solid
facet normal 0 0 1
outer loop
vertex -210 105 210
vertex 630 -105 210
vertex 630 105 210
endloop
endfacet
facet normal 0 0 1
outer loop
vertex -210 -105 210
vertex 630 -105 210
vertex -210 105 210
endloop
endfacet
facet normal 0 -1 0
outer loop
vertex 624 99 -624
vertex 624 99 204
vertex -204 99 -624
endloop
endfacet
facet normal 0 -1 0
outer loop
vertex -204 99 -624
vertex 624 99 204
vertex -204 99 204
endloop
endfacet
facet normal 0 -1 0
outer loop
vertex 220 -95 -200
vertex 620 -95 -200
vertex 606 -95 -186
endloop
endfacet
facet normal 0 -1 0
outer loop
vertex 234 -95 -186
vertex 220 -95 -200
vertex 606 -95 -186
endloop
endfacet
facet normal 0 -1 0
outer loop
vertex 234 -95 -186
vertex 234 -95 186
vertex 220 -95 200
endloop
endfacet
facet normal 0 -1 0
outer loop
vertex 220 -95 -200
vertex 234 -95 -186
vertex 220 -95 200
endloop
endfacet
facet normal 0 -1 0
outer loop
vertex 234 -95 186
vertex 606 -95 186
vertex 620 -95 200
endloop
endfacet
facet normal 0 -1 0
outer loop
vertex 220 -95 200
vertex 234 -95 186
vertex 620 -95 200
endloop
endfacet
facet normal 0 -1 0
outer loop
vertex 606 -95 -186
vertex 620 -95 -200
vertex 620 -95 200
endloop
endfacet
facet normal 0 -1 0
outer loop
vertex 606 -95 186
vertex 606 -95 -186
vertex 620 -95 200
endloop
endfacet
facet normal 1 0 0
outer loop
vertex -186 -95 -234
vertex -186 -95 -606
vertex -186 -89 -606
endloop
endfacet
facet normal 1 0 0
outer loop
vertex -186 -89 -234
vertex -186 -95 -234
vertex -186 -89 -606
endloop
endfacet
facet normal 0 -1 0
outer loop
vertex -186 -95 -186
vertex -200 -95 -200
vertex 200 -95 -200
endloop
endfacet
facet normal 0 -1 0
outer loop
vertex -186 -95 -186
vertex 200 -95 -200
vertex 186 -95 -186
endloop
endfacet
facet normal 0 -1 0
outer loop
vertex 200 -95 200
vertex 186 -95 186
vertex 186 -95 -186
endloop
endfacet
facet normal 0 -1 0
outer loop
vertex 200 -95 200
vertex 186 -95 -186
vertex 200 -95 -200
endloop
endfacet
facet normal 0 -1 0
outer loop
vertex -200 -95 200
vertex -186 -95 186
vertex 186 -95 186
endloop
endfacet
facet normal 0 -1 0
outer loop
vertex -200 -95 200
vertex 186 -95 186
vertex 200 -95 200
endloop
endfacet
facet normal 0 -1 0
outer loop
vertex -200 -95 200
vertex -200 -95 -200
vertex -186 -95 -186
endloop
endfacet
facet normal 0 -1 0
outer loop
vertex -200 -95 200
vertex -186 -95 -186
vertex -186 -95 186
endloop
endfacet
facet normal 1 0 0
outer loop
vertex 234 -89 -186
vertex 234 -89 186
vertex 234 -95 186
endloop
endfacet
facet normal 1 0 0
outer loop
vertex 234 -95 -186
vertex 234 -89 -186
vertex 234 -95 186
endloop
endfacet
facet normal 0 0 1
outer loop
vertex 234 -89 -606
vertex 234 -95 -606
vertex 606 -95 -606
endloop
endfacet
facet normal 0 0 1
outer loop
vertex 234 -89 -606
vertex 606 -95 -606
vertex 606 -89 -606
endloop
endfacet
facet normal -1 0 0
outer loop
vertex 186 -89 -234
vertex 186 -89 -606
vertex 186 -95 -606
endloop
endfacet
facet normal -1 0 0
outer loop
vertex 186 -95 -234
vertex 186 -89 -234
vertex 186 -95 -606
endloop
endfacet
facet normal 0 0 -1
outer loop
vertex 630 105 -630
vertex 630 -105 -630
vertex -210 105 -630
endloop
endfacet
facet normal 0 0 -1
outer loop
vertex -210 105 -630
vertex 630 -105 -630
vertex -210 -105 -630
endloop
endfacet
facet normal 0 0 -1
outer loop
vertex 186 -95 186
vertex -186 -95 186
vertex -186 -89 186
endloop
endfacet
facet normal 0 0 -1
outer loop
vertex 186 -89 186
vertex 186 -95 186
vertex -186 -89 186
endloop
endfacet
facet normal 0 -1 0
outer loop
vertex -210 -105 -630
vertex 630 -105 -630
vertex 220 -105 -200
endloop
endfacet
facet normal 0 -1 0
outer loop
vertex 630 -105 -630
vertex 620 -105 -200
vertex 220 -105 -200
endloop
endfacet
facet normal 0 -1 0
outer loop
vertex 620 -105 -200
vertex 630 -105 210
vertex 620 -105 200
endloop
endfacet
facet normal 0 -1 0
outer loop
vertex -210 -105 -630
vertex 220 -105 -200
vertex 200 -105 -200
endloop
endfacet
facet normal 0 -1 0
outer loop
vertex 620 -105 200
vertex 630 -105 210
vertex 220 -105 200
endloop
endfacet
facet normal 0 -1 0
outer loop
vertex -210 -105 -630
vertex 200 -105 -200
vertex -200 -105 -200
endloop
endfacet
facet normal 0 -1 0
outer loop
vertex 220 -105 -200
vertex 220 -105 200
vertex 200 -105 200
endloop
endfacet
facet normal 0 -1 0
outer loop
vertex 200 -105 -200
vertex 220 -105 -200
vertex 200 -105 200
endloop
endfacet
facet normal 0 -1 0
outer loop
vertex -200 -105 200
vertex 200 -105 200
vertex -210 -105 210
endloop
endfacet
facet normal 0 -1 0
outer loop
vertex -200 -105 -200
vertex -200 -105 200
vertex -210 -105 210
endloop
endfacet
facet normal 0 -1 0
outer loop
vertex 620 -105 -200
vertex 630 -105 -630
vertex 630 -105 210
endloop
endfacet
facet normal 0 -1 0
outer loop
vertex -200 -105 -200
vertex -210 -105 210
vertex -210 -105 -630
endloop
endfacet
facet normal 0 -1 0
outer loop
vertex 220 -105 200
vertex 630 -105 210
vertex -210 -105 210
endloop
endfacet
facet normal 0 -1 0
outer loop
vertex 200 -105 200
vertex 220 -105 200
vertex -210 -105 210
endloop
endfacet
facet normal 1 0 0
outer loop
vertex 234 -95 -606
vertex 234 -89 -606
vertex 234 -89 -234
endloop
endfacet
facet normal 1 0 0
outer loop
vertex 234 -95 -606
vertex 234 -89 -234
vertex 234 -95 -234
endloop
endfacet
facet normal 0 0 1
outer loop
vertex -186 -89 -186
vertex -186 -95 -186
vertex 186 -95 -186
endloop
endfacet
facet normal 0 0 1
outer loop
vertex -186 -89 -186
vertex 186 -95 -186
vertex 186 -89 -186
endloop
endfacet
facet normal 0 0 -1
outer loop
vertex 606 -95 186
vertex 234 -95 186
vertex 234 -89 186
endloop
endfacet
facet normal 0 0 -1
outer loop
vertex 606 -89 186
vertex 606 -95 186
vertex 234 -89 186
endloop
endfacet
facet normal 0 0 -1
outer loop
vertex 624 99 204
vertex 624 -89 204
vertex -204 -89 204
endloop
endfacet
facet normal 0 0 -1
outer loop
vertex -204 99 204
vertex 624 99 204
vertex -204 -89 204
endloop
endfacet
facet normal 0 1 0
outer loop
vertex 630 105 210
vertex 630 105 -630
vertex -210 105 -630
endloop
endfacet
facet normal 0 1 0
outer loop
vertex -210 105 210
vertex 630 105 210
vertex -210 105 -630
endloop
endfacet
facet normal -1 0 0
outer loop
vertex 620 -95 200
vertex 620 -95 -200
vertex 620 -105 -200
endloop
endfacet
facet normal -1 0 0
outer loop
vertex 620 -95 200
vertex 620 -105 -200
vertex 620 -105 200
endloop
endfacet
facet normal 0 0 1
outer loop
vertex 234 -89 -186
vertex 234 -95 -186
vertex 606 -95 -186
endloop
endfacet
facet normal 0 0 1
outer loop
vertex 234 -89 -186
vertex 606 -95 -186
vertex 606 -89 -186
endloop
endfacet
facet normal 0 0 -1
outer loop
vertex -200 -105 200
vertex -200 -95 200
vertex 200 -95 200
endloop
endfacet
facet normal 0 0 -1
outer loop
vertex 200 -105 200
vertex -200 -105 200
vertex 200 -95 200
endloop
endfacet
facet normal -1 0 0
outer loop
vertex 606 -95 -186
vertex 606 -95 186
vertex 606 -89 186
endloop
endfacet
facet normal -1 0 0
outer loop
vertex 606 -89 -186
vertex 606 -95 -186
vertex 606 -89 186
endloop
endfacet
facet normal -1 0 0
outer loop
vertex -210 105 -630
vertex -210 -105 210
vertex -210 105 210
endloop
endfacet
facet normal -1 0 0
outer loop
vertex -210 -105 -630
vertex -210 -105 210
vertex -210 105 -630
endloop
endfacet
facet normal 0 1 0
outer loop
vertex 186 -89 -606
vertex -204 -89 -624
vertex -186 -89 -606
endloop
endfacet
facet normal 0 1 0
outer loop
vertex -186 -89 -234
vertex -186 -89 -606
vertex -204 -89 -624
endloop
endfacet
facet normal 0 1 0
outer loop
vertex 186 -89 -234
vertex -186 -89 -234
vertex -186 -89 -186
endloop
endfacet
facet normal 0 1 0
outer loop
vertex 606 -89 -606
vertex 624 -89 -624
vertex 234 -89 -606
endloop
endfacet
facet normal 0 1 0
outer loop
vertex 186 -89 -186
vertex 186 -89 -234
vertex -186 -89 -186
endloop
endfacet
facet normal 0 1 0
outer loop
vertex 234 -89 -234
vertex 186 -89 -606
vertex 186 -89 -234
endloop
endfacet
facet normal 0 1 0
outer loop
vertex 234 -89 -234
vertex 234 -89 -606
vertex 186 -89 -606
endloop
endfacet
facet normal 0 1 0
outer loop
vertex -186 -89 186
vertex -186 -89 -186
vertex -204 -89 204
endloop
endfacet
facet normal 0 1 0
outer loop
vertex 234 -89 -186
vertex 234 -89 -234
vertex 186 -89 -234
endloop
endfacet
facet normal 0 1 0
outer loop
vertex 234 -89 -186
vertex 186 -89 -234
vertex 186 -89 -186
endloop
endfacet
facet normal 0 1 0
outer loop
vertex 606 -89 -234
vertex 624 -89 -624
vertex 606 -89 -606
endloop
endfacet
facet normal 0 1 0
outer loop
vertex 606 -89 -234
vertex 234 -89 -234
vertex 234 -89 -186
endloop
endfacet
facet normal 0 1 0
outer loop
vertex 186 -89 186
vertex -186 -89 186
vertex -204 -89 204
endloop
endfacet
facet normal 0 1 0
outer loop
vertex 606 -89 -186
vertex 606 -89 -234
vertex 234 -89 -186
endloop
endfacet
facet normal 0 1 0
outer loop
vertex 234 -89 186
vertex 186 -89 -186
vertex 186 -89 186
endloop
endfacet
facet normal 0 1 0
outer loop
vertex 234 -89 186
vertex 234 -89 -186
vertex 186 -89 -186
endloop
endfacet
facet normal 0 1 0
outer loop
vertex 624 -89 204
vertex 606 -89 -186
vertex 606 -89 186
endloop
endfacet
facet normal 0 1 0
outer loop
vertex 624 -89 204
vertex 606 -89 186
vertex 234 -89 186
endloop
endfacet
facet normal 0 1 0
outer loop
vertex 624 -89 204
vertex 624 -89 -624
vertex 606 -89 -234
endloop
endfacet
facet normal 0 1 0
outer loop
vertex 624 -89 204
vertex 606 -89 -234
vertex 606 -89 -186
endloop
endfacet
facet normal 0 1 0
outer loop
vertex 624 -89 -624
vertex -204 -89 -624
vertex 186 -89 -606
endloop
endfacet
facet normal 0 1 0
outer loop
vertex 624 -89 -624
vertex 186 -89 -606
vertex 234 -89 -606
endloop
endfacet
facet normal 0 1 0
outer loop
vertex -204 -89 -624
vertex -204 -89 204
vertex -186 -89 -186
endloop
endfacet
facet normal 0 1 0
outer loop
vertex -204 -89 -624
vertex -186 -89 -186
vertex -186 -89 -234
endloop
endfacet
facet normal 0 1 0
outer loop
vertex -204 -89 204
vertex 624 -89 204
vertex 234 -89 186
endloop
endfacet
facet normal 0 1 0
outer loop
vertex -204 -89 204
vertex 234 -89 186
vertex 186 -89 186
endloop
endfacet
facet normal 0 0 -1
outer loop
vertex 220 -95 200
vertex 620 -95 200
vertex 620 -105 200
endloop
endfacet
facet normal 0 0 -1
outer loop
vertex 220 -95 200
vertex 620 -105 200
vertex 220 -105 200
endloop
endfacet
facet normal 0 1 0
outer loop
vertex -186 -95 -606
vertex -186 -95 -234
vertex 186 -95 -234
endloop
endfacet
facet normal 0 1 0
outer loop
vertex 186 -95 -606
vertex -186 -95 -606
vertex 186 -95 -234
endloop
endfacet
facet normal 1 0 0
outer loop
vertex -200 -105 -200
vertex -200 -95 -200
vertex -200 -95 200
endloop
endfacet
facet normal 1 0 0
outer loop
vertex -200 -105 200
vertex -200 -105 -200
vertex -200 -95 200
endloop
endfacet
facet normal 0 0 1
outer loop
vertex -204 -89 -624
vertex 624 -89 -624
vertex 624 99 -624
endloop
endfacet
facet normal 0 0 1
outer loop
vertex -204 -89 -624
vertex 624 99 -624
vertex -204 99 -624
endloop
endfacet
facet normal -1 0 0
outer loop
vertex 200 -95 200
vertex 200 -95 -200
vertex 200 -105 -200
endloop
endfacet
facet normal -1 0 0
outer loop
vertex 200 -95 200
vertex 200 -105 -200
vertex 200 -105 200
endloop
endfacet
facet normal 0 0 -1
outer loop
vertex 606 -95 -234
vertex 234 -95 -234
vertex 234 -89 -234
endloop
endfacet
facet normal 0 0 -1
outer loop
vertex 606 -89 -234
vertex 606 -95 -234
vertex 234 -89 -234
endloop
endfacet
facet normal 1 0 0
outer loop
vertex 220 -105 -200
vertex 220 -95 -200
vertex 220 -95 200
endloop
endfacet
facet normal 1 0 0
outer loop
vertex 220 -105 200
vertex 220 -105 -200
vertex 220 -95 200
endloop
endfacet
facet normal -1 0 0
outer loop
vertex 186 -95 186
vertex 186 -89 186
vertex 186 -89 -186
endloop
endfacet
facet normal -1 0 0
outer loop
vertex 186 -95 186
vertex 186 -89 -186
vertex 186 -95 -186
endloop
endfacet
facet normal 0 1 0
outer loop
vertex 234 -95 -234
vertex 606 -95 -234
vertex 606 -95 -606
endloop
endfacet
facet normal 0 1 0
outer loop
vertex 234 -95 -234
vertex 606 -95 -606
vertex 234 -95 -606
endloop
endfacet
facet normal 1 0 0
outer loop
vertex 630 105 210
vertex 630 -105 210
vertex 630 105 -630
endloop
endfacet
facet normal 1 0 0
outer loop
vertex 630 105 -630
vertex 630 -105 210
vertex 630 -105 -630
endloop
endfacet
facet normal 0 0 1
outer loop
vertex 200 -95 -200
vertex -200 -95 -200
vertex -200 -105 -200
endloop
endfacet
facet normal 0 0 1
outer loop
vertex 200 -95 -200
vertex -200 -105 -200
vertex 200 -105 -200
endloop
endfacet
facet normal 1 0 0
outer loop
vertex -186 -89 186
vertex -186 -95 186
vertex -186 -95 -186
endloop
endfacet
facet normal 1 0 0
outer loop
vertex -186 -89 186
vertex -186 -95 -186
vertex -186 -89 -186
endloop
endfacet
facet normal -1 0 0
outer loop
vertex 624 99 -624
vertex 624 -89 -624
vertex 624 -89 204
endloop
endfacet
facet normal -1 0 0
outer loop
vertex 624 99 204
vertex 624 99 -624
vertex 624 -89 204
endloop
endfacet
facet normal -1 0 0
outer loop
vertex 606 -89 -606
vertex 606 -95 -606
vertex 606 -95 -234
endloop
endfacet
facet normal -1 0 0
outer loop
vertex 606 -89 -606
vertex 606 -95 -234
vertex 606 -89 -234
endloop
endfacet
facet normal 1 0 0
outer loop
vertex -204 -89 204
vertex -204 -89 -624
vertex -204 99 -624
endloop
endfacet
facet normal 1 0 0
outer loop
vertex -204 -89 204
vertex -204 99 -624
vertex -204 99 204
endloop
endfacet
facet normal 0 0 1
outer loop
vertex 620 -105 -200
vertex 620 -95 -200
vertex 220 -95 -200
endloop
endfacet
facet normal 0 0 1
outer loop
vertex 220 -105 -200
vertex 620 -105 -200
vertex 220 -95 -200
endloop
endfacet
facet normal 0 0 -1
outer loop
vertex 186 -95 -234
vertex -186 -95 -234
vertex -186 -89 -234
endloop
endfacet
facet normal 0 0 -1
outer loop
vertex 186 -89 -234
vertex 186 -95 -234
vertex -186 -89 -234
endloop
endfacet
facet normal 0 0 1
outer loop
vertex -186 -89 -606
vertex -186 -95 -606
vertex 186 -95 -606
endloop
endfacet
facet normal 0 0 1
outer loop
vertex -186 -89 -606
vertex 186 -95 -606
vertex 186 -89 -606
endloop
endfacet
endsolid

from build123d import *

# Parameters (mm, degrees)
F0_W      = 420
F0_H      = 420
F1_DEPTH  = 105
F2_T      = -6
F3_W      = 6
F3_H      = 408
F4_DEPTH  = 18
F5_W      = 6
F5_H      = 408
F6_DEPTH  = 18
F7_W      = 6
F7_H      = 18
F8_DEPTH  = 372
F9_W      = 6
F9_H      = 18
F10_DEPTH = 372
F11_W     = 408
F11_H     = 408
F11_W_2   = 400
F11_H_2   = 400
F12_DEPTH = 10
F14_W     = 400
F14_H     = 400
F15_DEPTH = 10
F16_DEPTH = 25.4
F18_DEPTH = 25.4


with BuildPart() as f1:
    # F0 (on Front) → F1 (new body, symmetric)
    with BuildSketch(Plane.XZ):
        Rectangle(F0_W, F0_H)
    extrude(amount=F1_DEPTH, both=True)

    # F2
    f2_openings = [f1.faces().sort_by_distance(p)[0] for p in [
        (0, -105, 0),
    ]]
    offset(amount=F2_T, openings=f2_openings)

    # F3 (on face) → F4 (join)
    with BuildSketch(Plane.YZ.offset(-204)):
        with Locations((-92, 0)):
            Rectangle(F3_W, F3_H)
    extrude(amount=F4_DEPTH)

    # F5 (on face) → F6 (join)
    with BuildSketch(Plane(origin=(204, 0, 0), x_dir=(0, -1, 0), z_dir=(-1, 0, 0))):
        with Locations((92, 0)):
            Rectangle(F5_W, F5_H)
    extrude(amount=F6_DEPTH)

    # F7 (on face) → F8 (join, through all)
    with BuildSketch(Plane.YZ.offset(-186)):
        with Locations((-92, 195)):
            Rectangle(F7_W, F7_H)
    extrude(amount=F8_DEPTH)

    # F9 (on face) → F10 (join, through all)
    with BuildSketch(Plane.YZ.offset(-186)):
        with Locations((-92, -195)):
            Rectangle(F9_W, F9_H)
    extrude(amount=F10_DEPTH)

    # F11 (on face) → F12 (join)
    with BuildSketch(Plane.XZ.offset(95)):
        Rectangle(F11_W, F11_H)
        Rectangle(F11_W_2, F11_H_2, mode=Mode.SUBTRACT)
    extrude(amount=F12_DEPTH)

    # F13: F1 across face


with BuildPart() as f1_1:
    add(f1.part)
    add(f1.part.mirror(Plane(origin=(0, 0, -210), x_dir=(1, 0, 0), z_dir=(0, 0, -1))))

    # F14 (on face) → F15 (join)
    with BuildSketch(Plane.XZ.offset(95)):
        with Locations((0, -420)):
            Rectangle(F14_W, F14_H)
    extrude(amount=F15_DEPTH)

    # F16 (cut): a face of the model
    f16_faces = [f1_1.faces().sort_by_distance(p)[0] for p in [
        (0, 5, -204),
    ]]
    extrude(f16_faces, amount=-F16_DEPTH, mode=Mode.SUBTRACT)

    # F17: F1 across face


with BuildPart() as f1_2:
    add(f1_1.part)
    add(f1_1.part.mirror(Plane(origin=(210, 0, -210), x_dir=(0, 1, 0), z_dir=(1, 0, 0))))

    # F18 (cut): a face of the model
    f18_faces = [f1_2.faces().sort_by_distance(p)[0] for p in [
        (216, 5, -210),
    ]]
    extrude(f18_faces, amount=-F18_DEPTH, mode=Mode.SUBTRACT)


solid = f1_2.part
